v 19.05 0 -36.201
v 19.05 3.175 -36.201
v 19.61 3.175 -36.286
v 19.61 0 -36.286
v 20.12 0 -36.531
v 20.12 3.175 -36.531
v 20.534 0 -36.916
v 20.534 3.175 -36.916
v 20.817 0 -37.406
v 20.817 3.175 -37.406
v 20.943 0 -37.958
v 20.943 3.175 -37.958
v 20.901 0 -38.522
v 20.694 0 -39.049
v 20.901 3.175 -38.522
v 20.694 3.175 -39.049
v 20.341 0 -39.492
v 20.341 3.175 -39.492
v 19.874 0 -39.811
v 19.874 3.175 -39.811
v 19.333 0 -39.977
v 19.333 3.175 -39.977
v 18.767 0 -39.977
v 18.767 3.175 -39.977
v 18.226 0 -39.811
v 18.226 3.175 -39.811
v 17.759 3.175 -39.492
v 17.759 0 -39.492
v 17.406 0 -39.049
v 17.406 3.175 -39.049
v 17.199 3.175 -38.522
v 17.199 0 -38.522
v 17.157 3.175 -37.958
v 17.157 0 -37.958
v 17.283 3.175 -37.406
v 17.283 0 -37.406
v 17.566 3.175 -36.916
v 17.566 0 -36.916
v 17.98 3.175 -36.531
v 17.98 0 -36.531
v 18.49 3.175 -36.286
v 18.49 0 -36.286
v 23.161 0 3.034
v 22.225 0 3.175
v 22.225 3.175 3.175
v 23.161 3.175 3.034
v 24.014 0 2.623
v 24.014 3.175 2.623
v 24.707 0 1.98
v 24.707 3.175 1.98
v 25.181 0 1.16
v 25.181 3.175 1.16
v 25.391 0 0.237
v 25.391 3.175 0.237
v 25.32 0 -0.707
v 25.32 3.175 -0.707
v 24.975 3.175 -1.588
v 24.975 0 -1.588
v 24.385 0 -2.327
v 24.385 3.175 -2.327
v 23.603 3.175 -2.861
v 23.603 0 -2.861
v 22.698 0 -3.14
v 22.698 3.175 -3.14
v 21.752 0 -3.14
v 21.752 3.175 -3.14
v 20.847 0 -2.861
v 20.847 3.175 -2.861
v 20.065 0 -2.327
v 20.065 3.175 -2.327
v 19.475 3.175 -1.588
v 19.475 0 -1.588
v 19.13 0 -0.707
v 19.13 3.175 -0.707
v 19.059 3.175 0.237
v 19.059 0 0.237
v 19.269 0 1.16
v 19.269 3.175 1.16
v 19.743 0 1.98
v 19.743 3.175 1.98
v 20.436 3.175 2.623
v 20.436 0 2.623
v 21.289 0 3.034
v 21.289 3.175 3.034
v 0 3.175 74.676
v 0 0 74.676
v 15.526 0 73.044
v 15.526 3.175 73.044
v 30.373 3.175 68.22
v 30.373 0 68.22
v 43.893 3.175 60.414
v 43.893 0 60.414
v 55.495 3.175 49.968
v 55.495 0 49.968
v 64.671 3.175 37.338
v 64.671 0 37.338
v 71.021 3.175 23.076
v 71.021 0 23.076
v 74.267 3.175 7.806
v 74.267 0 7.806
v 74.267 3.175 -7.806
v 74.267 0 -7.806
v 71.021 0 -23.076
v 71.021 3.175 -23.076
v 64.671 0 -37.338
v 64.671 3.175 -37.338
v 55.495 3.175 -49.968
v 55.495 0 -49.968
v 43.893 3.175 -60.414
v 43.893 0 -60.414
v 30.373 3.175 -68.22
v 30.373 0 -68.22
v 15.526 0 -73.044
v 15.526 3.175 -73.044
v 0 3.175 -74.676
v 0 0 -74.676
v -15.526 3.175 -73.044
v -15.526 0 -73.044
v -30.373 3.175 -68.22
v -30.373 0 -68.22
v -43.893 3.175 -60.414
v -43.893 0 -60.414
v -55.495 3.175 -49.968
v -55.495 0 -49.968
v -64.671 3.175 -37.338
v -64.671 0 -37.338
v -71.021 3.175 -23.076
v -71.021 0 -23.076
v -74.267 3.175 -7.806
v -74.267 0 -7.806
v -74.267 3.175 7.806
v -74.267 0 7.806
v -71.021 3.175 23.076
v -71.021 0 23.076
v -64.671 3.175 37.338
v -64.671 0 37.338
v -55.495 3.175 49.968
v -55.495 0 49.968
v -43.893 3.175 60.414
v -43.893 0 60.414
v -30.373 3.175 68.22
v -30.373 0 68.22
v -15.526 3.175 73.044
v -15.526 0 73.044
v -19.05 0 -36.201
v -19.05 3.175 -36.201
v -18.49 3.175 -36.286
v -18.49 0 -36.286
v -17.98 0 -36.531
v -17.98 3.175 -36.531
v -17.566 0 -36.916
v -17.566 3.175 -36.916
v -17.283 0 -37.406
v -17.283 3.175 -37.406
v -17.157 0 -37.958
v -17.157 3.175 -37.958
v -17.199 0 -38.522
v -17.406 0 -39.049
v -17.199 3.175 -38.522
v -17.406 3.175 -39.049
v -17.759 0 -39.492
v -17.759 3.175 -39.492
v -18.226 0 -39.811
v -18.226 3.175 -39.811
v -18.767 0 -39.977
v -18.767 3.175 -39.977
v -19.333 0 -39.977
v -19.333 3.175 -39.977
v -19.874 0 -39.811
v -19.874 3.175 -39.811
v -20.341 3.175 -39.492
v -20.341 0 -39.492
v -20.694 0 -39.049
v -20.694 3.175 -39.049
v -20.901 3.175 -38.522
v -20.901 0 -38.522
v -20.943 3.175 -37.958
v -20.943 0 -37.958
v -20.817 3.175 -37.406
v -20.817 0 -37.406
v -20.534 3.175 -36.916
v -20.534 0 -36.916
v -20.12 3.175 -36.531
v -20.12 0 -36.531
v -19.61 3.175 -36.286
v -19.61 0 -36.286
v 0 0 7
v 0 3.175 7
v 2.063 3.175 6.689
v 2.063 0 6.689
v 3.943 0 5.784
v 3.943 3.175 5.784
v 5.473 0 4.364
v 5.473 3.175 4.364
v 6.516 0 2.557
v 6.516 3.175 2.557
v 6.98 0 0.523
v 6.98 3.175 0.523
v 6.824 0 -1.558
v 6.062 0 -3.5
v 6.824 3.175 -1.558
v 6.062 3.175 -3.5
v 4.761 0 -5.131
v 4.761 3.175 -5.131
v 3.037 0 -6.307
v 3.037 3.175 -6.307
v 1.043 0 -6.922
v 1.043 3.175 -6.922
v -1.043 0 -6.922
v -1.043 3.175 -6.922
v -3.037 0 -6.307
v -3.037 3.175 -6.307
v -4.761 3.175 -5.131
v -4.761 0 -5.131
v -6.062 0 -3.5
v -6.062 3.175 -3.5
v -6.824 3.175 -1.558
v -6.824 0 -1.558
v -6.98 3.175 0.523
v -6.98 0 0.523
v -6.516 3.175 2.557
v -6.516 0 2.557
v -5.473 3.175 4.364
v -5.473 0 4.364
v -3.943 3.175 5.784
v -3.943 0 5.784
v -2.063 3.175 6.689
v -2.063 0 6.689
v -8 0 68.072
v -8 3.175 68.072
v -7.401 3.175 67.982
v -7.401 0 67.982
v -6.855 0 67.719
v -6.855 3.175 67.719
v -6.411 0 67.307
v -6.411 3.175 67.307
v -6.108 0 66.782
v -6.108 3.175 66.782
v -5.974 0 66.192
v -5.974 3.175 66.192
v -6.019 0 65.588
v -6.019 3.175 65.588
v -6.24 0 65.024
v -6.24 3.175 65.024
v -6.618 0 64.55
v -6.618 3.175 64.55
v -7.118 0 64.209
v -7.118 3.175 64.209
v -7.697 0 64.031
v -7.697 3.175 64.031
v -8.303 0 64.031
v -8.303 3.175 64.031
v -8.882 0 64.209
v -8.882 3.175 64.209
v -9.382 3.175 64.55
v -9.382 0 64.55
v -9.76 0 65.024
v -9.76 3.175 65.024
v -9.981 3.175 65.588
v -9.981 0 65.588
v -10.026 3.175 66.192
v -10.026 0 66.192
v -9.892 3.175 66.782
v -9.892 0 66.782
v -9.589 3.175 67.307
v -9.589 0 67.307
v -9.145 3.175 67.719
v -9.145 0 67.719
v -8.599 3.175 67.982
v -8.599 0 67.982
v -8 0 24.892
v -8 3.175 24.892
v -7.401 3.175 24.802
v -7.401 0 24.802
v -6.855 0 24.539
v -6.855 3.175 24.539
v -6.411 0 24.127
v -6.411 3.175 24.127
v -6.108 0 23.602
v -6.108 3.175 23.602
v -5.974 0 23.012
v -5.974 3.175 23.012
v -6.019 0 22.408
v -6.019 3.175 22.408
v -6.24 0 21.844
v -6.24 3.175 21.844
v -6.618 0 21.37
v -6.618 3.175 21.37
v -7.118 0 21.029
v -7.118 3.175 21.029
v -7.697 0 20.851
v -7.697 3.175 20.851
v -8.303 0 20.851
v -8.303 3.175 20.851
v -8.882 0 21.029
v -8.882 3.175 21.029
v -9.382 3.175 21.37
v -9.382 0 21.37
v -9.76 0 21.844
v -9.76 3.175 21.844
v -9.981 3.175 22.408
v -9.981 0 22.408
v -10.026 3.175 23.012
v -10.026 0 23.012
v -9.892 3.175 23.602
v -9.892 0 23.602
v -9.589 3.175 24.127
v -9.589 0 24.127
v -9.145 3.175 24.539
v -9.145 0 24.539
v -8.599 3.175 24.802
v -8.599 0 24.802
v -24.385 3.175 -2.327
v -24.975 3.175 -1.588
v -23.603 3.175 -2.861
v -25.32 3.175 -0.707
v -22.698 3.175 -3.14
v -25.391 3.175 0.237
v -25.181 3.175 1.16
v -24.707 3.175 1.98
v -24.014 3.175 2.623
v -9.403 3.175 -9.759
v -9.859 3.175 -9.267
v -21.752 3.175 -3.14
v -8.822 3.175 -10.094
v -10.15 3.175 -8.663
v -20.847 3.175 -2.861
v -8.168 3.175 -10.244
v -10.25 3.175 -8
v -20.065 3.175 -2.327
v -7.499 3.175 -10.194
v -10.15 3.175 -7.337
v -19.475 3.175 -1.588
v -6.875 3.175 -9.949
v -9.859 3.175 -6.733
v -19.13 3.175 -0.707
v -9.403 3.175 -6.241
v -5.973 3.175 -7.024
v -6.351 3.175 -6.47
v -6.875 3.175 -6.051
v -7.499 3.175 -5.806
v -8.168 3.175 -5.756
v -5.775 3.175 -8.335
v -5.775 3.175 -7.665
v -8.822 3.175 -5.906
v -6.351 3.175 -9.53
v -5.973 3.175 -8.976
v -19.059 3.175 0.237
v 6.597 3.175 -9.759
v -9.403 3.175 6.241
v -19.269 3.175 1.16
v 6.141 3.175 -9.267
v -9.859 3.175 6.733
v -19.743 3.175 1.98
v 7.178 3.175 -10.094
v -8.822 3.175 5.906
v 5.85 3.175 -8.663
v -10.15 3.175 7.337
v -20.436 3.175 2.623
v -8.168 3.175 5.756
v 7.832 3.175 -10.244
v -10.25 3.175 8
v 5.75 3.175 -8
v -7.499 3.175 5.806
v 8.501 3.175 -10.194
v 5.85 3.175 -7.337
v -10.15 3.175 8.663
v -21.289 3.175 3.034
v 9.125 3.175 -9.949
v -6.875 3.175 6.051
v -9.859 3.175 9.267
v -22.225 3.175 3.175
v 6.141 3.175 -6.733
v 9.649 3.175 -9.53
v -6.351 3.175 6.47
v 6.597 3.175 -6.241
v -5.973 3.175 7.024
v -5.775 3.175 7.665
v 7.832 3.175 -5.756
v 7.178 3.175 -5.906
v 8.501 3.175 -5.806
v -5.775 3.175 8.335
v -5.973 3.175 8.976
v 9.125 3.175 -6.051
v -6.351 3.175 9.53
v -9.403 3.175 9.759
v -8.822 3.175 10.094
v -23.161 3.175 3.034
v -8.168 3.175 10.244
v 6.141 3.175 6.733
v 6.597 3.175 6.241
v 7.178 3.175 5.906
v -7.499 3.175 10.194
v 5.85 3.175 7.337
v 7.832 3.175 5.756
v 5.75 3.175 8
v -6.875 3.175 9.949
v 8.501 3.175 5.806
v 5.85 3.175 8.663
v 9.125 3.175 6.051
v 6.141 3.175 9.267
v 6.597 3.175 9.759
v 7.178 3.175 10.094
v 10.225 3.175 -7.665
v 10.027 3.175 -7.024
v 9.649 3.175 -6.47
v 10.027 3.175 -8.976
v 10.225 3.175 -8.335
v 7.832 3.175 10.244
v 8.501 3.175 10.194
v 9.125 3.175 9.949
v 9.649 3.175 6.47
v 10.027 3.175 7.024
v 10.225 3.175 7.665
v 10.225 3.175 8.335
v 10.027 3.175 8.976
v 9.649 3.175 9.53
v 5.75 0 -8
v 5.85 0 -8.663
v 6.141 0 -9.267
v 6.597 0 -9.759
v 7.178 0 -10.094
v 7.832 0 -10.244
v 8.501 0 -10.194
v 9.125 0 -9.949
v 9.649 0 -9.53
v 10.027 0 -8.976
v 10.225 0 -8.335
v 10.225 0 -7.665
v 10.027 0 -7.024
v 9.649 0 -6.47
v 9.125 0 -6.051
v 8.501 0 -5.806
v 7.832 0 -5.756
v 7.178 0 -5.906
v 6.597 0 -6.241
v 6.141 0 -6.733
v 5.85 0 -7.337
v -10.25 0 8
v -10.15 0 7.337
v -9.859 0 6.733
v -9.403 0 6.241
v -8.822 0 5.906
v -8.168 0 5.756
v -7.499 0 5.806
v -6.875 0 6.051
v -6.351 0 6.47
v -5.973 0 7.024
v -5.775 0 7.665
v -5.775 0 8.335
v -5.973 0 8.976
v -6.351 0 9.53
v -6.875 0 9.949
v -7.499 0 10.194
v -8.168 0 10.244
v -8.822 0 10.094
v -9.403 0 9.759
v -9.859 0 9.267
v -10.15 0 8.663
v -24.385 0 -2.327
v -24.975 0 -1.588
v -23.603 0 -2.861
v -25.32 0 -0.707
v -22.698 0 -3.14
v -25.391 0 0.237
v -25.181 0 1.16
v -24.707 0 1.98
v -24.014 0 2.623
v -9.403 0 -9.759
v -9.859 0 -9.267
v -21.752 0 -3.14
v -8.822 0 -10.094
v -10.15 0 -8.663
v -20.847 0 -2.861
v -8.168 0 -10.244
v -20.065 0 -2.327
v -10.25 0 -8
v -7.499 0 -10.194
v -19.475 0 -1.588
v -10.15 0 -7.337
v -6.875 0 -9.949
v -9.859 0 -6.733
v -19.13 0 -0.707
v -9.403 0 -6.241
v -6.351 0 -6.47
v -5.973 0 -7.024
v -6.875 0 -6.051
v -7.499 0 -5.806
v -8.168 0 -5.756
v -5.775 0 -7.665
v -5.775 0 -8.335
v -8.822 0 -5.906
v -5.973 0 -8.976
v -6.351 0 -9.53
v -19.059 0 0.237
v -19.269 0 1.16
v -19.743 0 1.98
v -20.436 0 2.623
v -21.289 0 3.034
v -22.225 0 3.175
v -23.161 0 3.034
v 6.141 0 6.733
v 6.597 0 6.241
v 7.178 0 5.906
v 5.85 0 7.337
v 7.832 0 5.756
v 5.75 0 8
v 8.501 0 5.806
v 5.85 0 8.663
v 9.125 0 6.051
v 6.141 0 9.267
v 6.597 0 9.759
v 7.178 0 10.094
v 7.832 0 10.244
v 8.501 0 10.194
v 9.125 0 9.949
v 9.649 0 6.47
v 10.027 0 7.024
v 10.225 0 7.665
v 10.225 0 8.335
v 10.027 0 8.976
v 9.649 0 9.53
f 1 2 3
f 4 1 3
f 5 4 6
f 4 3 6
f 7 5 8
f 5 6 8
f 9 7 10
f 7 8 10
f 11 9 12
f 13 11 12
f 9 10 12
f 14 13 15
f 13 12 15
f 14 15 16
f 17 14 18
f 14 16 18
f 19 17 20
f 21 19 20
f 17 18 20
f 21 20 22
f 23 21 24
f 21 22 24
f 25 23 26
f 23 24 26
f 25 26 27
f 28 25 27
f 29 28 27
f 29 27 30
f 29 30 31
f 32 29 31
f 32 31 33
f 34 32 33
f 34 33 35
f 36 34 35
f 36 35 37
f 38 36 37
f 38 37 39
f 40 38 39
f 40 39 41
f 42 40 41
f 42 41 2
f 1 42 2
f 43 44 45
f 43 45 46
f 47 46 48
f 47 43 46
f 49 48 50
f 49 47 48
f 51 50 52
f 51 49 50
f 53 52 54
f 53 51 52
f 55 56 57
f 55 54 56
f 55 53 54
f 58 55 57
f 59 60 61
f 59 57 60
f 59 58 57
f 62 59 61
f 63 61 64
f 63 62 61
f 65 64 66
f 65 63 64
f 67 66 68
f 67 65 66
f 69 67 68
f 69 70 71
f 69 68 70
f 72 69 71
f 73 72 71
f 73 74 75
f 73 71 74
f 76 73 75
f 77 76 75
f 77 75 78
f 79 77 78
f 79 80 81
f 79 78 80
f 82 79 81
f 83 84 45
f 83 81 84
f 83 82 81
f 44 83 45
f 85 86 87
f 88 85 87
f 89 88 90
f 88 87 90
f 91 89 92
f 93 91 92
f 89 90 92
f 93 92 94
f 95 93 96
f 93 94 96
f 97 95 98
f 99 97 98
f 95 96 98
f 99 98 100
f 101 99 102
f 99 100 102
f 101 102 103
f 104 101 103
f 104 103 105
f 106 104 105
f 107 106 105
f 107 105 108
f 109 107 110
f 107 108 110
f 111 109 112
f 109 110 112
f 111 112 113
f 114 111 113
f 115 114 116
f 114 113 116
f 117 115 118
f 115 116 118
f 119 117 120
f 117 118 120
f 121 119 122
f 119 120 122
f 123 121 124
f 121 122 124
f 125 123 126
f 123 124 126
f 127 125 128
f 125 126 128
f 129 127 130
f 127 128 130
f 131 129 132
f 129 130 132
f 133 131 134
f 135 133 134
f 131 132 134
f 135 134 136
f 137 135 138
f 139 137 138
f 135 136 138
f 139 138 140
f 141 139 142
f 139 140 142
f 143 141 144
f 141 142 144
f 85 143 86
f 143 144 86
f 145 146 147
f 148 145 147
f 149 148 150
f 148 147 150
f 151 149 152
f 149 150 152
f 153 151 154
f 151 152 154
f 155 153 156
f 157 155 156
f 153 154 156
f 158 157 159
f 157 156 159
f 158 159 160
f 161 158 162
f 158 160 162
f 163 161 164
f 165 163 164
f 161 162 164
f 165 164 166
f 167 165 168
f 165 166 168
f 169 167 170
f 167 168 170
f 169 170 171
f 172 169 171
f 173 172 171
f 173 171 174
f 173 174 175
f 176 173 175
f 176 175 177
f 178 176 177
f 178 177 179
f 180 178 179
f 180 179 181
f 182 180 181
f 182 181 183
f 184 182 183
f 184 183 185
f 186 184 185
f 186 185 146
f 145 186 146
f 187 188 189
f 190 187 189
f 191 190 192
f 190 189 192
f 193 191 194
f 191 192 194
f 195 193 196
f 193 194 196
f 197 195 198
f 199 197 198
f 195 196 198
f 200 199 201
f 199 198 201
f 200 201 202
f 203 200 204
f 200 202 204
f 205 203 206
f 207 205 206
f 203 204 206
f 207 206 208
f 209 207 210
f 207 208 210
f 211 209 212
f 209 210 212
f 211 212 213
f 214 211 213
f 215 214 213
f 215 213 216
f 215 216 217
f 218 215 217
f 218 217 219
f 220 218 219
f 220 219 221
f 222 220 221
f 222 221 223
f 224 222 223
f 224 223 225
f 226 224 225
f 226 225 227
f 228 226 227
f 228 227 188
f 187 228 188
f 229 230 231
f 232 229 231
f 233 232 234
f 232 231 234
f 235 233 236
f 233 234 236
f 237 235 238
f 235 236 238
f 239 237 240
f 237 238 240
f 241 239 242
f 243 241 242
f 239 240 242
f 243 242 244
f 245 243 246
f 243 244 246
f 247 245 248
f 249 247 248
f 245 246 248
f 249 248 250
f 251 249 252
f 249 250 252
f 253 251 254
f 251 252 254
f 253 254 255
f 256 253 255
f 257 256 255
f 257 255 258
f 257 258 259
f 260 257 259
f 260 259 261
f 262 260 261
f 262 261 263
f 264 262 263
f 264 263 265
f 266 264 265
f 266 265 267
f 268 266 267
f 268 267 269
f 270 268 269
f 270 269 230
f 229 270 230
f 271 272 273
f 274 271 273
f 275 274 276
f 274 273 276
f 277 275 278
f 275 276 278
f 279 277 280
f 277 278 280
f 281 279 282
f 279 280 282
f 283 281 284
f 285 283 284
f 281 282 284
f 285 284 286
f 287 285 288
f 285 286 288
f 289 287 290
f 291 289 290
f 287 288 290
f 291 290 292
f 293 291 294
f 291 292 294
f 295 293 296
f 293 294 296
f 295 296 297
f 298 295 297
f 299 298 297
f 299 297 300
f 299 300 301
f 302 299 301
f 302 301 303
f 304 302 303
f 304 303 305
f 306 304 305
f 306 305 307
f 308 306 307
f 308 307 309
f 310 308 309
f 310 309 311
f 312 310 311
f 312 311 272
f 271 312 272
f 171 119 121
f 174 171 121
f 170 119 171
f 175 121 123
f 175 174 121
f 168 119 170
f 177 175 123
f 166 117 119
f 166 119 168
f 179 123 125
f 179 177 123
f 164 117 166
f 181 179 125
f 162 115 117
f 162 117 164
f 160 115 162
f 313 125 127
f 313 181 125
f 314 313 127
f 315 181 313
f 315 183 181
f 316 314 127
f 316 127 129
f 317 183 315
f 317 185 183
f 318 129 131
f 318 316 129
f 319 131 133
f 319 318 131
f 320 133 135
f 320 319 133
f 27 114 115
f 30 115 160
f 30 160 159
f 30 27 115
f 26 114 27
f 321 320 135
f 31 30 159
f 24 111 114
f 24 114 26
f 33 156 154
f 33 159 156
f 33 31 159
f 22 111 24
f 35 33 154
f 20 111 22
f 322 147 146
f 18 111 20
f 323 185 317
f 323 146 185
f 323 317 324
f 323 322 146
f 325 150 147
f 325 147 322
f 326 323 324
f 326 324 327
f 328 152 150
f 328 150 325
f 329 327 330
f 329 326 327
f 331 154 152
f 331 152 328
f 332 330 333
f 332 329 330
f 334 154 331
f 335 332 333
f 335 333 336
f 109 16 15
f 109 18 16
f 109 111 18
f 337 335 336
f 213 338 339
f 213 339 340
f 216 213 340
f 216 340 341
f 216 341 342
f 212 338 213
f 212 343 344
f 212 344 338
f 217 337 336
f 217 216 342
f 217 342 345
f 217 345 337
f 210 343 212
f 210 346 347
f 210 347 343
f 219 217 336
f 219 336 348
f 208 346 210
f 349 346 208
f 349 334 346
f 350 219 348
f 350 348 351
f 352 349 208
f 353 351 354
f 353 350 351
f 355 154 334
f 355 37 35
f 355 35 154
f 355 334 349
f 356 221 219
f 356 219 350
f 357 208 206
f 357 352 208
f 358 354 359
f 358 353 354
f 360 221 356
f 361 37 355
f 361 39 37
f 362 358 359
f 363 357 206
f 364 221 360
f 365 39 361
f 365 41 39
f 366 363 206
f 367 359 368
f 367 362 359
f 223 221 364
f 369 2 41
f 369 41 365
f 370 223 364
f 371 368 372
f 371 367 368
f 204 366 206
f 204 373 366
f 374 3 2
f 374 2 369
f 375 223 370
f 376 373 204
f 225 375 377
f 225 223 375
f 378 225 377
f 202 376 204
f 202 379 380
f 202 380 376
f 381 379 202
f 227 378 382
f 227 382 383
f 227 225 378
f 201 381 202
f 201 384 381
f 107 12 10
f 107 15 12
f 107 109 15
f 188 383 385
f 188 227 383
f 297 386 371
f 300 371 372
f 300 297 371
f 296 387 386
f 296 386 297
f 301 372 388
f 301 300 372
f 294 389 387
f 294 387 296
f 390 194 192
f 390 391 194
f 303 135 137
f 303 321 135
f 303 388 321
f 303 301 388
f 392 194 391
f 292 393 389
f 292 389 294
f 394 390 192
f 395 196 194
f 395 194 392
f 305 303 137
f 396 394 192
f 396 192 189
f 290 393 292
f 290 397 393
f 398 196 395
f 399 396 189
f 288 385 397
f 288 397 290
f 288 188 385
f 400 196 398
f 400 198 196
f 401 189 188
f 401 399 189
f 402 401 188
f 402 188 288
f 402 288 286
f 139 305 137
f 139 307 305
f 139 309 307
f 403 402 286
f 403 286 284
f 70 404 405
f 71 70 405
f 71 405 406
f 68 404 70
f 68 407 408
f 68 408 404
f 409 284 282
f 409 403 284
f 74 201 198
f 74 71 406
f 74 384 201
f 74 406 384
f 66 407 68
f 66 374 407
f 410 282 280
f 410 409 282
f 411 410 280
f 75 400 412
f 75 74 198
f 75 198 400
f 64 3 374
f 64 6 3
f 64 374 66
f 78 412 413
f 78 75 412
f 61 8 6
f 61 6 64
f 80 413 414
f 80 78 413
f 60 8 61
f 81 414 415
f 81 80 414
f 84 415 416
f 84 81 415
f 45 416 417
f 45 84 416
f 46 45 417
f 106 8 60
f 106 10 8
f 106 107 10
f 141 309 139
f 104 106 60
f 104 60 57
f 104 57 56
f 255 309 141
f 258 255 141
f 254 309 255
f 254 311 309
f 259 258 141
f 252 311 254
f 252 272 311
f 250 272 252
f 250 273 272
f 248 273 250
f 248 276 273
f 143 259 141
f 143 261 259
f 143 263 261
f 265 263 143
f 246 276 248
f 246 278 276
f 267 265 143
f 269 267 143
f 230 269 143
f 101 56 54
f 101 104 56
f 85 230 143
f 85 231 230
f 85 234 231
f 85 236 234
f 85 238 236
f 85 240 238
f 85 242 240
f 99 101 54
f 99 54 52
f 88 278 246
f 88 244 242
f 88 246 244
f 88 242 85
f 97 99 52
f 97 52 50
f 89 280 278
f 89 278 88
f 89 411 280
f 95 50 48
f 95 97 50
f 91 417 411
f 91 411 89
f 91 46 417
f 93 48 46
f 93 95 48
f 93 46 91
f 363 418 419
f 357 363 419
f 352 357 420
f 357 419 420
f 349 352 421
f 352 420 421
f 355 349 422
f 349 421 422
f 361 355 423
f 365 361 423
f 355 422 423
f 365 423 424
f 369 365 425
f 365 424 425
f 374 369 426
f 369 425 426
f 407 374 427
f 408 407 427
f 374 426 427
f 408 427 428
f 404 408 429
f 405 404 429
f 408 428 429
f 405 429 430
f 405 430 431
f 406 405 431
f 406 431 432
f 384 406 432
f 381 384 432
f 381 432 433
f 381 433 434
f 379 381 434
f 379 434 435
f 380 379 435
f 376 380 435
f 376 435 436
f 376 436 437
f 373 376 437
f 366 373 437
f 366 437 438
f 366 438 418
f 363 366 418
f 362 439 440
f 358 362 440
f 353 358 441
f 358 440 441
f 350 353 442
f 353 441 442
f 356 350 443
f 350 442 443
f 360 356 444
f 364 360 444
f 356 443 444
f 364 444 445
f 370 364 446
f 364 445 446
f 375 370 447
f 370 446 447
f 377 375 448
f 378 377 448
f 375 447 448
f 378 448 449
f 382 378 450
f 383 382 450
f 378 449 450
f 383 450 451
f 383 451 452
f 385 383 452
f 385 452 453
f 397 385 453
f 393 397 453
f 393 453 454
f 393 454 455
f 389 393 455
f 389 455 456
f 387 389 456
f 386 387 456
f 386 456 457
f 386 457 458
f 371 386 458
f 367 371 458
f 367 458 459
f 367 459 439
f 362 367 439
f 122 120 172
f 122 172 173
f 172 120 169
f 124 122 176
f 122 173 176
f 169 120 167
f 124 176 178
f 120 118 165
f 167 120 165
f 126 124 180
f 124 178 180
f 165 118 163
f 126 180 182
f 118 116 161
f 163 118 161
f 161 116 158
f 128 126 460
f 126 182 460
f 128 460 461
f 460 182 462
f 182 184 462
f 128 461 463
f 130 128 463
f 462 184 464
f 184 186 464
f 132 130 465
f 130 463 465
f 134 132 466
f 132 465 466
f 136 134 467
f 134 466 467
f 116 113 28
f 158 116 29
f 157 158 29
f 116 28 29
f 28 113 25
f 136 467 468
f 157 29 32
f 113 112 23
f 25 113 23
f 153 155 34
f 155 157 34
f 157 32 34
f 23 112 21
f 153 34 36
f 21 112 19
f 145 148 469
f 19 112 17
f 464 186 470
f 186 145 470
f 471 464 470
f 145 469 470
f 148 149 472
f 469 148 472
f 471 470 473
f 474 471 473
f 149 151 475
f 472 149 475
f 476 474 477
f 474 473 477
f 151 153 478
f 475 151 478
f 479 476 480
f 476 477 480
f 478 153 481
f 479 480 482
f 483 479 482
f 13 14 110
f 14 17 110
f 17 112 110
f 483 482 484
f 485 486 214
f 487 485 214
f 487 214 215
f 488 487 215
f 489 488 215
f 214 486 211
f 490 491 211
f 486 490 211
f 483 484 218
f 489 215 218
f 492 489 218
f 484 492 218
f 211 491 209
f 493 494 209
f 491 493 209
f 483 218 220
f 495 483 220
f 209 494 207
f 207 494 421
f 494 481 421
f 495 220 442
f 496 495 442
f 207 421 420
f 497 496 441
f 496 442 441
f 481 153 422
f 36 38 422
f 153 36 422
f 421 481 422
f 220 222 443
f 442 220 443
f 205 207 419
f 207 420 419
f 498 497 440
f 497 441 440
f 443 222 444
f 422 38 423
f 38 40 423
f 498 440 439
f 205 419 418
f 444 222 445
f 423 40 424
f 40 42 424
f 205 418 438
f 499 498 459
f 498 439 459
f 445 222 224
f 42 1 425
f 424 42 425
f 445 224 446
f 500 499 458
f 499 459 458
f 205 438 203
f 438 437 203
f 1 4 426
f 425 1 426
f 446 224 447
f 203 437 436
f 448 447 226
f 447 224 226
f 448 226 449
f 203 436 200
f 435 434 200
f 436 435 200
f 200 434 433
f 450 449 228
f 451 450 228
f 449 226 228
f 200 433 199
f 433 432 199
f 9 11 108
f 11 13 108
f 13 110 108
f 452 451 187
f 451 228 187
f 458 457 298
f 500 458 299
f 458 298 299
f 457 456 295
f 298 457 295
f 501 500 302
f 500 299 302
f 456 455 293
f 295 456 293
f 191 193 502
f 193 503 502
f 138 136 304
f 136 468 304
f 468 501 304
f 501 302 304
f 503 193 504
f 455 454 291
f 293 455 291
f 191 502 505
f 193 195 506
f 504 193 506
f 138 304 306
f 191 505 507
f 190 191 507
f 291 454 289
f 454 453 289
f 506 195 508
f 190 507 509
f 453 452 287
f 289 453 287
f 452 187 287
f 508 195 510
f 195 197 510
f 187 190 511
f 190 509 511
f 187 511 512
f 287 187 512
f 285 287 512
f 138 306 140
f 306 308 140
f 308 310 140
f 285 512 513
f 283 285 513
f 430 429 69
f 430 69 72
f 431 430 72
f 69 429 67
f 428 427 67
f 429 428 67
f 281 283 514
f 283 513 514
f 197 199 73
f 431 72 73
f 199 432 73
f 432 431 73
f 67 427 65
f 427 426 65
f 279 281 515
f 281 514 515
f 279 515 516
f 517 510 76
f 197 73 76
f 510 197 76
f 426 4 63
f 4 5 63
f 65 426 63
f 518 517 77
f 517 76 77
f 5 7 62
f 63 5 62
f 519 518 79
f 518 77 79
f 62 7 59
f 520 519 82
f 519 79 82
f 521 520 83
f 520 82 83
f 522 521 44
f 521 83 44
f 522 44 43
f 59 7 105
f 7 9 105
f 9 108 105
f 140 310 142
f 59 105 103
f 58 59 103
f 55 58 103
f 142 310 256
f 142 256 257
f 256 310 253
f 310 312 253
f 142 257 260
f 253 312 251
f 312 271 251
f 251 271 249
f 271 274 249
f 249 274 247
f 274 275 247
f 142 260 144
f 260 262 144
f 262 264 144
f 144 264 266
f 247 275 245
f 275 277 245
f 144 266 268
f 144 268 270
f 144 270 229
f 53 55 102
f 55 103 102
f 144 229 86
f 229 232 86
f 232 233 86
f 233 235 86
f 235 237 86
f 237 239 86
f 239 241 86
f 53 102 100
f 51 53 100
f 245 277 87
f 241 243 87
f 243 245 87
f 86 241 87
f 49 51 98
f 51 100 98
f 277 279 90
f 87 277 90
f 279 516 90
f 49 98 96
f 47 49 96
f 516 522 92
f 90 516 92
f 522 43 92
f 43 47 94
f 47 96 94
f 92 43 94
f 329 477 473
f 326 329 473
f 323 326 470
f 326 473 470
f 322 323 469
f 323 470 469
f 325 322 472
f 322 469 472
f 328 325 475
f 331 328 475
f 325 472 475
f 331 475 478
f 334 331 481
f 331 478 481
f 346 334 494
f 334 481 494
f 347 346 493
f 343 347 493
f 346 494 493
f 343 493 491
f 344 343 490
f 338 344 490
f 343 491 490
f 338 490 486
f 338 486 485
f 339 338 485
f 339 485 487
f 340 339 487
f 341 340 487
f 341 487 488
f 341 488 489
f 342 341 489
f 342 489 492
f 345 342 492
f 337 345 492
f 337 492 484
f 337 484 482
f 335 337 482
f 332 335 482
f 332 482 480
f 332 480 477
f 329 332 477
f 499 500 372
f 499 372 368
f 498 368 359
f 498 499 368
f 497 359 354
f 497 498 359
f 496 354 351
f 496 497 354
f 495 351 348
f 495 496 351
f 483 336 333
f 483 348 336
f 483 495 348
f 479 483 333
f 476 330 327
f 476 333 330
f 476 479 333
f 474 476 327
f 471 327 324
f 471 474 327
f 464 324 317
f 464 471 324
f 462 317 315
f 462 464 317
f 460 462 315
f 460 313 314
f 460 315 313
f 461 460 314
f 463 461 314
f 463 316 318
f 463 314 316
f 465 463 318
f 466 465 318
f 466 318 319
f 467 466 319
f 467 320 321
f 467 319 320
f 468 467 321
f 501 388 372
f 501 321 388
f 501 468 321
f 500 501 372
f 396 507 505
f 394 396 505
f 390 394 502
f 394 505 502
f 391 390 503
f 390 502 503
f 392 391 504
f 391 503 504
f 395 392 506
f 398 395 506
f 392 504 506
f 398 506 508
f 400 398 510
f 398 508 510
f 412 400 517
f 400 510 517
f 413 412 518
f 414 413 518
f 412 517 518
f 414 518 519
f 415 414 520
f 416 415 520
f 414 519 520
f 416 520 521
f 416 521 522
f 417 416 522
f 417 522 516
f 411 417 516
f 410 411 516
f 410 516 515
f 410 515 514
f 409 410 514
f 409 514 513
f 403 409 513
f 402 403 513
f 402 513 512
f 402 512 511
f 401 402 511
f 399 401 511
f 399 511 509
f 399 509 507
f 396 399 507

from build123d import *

# Parameters (mm, degrees)
SKETCH1_R               = 74.676
BOSS_EXTRUDE1_DEPTH     = 3.175
CUT_EXTRUDE1_REACH      = 107.656
SKETCH2_R               = 7
CUT_EXTRUDE3_DEPTH      = 106.655527906
CUT_EXTRUDE3_DEPTH_BACK = 106.655527906
SKETCH4_R               = 3.175
M4_CLEARANCE_HOLE1_D    = 4.5
CUT_EXTRUDE4_REACH      = 107.656
SKETCH8_R               = 1.89865
CUT_EXTRUDE5_REACH      = 107.656
SKETCH9_R               = 2.032


with BuildPart() as part:
    # Sketch1 → Boss-Extrude1 (new body)
    with BuildSketch(Plane(origin=(0, 0, 0), x_dir=(1, 0, 0), z_dir=(0, 1, 0))):
        with Locations(Location((0, 0, 0), (0, 0, 270))):
            Circle(SKETCH1_R)
    extrude(amount=BOSS_EXTRUDE1_DEPTH)

    # Sketch2 → Cut-Extrude1 (cut, up to next)
    with BuildSketch(Plane(origin=(0, 3.175, 0), x_dir=(1, 0, 0), z_dir=(0, 1, 0)), mode=Mode.PRIVATE) as cut_extrude1_sk1:
        with Locations(Location((0, 0, 0), (0, 0, 270))):
            Circle(SKETCH2_R)
    cut_extrude1_tool1 = extrude(cut_extrude1_sk1.sketch, amount=-CUT_EXTRUDE1_REACH, mode=Mode.PRIVATE) & part.part
    add(cut_extrude1_tool1.solids().sort_by_distance((0, 3.175, 0))[0], mode=Mode.SUBTRACT)

    # Sketch4 → Cut-Extrude3 (cut, two sides: drawn at the far end of the back side and taken through both)
    with BuildSketch(Plane(origin=(0, 3.175, 0), x_dir=(1, 0, 0), z_dir=(0, 1, 0)).offset(-CUT_EXTRUDE3_DEPTH_BACK)):
        with Locations(Location((-22.225, 0, 0), (0, 0, 270))):
            Circle(SKETCH4_R)
        with Locations(Location((22.225, 0, 0), (0, 0, 270))):
            Circle(SKETCH4_R)
    extrude(amount=CUT_EXTRUDE3_DEPTH + CUT_EXTRUDE3_DEPTH_BACK, mode=Mode.SUBTRACT)

    # M4 Clearance Hole1 (through all)
    with Locations(Plane(origin=(0, 3.175, 0), x_dir=(1, 0, 0), z_dir=(0, 1, 0))):
        with Locations((-8, 8), (8, 8), (8, -8), (-8, -8)):
            Hole(M4_CLEARANCE_HOLE1_D / 2)

    # Sketch8 → Cut-Extrude4 (cut, up to next)
    with BuildSketch(Plane(origin=(0, 3.175, 0), x_dir=(1, 0, 0), z_dir=(0, 1, 0)), mode=Mode.PRIVATE) as cut_extrude4_sk1:
        with Locations(Location((19.05, 38.1, 0), (0, 0, 270))):
            Circle(SKETCH8_R)
    cut_extrude4_tool1 = extrude(cut_extrude4_sk1.sketch, amount=-CUT_EXTRUDE4_REACH, mode=Mode.PRIVATE) & part.part
    # Sketch8 → Cut-Extrude4 (cut, up to next)
    with BuildSketch(Plane(origin=(0, 3.175, 0), x_dir=(1, 0, 0), z_dir=(0, 1, 0)), mode=Mode.PRIVATE) as cut_extrude4_sk2:
        with Locations(Location((-19.05, 38.1, 0), (0, 0, 270))):
            Circle(SKETCH8_R)
    cut_extrude4_tool2 = extrude(cut_extrude4_sk2.sketch, amount=-CUT_EXTRUDE4_REACH, mode=Mode.PRIVATE) & part.part
    add(cut_extrude4_tool1.solids().sort_by_distance((19.05, 3.175, -38.1))[0], mode=Mode.SUBTRACT)
    add(cut_extrude4_tool2.solids().sort_by_distance((-19.05, 3.175, -38.1))[0], mode=Mode.SUBTRACT)

    # Sketch9 → Cut-Extrude5 (cut, up to next)
    with BuildSketch(Plane(origin=(0, 3.175, 0), x_dir=(1, 0, 0), z_dir=(0, 1, 0)), mode=Mode.PRIVATE) as cut_extrude5_sk1:
        with Locations(Location((-8, -22.86, 0), (0, 0, 270))):
            Circle(SKETCH9_R)
    cut_extrude5_tool1 = extrude(cut_extrude5_sk1.sketch, amount=-CUT_EXTRUDE5_REACH, mode=Mode.PRIVATE) & part.part
    # Sketch9 → Cut-Extrude5 (cut, up to next)
    with BuildSketch(Plane(origin=(0, 3.175, 0), x_dir=(1, 0, 0), z_dir=(0, 1, 0)), mode=Mode.PRIVATE) as cut_extrude5_sk2:
        with Locations(Location((-8, -66.04, 0), (0, 0, 270))):
            Circle(SKETCH9_R)
    cut_extrude5_tool2 = extrude(cut_extrude5_sk2.sketch, amount=-CUT_EXTRUDE5_REACH, mode=Mode.PRIVATE) & part.part
    add(cut_extrude5_tool1.solids().sort_by_distance((-8, 3.175, 22.86))[0], mode=Mode.SUBTRACT)
    add(cut_extrude5_tool2.solids().sort_by_distance((-8, 3.175, 66.04))[0], mode=Mode.SUBTRACT)


solid = part.part
